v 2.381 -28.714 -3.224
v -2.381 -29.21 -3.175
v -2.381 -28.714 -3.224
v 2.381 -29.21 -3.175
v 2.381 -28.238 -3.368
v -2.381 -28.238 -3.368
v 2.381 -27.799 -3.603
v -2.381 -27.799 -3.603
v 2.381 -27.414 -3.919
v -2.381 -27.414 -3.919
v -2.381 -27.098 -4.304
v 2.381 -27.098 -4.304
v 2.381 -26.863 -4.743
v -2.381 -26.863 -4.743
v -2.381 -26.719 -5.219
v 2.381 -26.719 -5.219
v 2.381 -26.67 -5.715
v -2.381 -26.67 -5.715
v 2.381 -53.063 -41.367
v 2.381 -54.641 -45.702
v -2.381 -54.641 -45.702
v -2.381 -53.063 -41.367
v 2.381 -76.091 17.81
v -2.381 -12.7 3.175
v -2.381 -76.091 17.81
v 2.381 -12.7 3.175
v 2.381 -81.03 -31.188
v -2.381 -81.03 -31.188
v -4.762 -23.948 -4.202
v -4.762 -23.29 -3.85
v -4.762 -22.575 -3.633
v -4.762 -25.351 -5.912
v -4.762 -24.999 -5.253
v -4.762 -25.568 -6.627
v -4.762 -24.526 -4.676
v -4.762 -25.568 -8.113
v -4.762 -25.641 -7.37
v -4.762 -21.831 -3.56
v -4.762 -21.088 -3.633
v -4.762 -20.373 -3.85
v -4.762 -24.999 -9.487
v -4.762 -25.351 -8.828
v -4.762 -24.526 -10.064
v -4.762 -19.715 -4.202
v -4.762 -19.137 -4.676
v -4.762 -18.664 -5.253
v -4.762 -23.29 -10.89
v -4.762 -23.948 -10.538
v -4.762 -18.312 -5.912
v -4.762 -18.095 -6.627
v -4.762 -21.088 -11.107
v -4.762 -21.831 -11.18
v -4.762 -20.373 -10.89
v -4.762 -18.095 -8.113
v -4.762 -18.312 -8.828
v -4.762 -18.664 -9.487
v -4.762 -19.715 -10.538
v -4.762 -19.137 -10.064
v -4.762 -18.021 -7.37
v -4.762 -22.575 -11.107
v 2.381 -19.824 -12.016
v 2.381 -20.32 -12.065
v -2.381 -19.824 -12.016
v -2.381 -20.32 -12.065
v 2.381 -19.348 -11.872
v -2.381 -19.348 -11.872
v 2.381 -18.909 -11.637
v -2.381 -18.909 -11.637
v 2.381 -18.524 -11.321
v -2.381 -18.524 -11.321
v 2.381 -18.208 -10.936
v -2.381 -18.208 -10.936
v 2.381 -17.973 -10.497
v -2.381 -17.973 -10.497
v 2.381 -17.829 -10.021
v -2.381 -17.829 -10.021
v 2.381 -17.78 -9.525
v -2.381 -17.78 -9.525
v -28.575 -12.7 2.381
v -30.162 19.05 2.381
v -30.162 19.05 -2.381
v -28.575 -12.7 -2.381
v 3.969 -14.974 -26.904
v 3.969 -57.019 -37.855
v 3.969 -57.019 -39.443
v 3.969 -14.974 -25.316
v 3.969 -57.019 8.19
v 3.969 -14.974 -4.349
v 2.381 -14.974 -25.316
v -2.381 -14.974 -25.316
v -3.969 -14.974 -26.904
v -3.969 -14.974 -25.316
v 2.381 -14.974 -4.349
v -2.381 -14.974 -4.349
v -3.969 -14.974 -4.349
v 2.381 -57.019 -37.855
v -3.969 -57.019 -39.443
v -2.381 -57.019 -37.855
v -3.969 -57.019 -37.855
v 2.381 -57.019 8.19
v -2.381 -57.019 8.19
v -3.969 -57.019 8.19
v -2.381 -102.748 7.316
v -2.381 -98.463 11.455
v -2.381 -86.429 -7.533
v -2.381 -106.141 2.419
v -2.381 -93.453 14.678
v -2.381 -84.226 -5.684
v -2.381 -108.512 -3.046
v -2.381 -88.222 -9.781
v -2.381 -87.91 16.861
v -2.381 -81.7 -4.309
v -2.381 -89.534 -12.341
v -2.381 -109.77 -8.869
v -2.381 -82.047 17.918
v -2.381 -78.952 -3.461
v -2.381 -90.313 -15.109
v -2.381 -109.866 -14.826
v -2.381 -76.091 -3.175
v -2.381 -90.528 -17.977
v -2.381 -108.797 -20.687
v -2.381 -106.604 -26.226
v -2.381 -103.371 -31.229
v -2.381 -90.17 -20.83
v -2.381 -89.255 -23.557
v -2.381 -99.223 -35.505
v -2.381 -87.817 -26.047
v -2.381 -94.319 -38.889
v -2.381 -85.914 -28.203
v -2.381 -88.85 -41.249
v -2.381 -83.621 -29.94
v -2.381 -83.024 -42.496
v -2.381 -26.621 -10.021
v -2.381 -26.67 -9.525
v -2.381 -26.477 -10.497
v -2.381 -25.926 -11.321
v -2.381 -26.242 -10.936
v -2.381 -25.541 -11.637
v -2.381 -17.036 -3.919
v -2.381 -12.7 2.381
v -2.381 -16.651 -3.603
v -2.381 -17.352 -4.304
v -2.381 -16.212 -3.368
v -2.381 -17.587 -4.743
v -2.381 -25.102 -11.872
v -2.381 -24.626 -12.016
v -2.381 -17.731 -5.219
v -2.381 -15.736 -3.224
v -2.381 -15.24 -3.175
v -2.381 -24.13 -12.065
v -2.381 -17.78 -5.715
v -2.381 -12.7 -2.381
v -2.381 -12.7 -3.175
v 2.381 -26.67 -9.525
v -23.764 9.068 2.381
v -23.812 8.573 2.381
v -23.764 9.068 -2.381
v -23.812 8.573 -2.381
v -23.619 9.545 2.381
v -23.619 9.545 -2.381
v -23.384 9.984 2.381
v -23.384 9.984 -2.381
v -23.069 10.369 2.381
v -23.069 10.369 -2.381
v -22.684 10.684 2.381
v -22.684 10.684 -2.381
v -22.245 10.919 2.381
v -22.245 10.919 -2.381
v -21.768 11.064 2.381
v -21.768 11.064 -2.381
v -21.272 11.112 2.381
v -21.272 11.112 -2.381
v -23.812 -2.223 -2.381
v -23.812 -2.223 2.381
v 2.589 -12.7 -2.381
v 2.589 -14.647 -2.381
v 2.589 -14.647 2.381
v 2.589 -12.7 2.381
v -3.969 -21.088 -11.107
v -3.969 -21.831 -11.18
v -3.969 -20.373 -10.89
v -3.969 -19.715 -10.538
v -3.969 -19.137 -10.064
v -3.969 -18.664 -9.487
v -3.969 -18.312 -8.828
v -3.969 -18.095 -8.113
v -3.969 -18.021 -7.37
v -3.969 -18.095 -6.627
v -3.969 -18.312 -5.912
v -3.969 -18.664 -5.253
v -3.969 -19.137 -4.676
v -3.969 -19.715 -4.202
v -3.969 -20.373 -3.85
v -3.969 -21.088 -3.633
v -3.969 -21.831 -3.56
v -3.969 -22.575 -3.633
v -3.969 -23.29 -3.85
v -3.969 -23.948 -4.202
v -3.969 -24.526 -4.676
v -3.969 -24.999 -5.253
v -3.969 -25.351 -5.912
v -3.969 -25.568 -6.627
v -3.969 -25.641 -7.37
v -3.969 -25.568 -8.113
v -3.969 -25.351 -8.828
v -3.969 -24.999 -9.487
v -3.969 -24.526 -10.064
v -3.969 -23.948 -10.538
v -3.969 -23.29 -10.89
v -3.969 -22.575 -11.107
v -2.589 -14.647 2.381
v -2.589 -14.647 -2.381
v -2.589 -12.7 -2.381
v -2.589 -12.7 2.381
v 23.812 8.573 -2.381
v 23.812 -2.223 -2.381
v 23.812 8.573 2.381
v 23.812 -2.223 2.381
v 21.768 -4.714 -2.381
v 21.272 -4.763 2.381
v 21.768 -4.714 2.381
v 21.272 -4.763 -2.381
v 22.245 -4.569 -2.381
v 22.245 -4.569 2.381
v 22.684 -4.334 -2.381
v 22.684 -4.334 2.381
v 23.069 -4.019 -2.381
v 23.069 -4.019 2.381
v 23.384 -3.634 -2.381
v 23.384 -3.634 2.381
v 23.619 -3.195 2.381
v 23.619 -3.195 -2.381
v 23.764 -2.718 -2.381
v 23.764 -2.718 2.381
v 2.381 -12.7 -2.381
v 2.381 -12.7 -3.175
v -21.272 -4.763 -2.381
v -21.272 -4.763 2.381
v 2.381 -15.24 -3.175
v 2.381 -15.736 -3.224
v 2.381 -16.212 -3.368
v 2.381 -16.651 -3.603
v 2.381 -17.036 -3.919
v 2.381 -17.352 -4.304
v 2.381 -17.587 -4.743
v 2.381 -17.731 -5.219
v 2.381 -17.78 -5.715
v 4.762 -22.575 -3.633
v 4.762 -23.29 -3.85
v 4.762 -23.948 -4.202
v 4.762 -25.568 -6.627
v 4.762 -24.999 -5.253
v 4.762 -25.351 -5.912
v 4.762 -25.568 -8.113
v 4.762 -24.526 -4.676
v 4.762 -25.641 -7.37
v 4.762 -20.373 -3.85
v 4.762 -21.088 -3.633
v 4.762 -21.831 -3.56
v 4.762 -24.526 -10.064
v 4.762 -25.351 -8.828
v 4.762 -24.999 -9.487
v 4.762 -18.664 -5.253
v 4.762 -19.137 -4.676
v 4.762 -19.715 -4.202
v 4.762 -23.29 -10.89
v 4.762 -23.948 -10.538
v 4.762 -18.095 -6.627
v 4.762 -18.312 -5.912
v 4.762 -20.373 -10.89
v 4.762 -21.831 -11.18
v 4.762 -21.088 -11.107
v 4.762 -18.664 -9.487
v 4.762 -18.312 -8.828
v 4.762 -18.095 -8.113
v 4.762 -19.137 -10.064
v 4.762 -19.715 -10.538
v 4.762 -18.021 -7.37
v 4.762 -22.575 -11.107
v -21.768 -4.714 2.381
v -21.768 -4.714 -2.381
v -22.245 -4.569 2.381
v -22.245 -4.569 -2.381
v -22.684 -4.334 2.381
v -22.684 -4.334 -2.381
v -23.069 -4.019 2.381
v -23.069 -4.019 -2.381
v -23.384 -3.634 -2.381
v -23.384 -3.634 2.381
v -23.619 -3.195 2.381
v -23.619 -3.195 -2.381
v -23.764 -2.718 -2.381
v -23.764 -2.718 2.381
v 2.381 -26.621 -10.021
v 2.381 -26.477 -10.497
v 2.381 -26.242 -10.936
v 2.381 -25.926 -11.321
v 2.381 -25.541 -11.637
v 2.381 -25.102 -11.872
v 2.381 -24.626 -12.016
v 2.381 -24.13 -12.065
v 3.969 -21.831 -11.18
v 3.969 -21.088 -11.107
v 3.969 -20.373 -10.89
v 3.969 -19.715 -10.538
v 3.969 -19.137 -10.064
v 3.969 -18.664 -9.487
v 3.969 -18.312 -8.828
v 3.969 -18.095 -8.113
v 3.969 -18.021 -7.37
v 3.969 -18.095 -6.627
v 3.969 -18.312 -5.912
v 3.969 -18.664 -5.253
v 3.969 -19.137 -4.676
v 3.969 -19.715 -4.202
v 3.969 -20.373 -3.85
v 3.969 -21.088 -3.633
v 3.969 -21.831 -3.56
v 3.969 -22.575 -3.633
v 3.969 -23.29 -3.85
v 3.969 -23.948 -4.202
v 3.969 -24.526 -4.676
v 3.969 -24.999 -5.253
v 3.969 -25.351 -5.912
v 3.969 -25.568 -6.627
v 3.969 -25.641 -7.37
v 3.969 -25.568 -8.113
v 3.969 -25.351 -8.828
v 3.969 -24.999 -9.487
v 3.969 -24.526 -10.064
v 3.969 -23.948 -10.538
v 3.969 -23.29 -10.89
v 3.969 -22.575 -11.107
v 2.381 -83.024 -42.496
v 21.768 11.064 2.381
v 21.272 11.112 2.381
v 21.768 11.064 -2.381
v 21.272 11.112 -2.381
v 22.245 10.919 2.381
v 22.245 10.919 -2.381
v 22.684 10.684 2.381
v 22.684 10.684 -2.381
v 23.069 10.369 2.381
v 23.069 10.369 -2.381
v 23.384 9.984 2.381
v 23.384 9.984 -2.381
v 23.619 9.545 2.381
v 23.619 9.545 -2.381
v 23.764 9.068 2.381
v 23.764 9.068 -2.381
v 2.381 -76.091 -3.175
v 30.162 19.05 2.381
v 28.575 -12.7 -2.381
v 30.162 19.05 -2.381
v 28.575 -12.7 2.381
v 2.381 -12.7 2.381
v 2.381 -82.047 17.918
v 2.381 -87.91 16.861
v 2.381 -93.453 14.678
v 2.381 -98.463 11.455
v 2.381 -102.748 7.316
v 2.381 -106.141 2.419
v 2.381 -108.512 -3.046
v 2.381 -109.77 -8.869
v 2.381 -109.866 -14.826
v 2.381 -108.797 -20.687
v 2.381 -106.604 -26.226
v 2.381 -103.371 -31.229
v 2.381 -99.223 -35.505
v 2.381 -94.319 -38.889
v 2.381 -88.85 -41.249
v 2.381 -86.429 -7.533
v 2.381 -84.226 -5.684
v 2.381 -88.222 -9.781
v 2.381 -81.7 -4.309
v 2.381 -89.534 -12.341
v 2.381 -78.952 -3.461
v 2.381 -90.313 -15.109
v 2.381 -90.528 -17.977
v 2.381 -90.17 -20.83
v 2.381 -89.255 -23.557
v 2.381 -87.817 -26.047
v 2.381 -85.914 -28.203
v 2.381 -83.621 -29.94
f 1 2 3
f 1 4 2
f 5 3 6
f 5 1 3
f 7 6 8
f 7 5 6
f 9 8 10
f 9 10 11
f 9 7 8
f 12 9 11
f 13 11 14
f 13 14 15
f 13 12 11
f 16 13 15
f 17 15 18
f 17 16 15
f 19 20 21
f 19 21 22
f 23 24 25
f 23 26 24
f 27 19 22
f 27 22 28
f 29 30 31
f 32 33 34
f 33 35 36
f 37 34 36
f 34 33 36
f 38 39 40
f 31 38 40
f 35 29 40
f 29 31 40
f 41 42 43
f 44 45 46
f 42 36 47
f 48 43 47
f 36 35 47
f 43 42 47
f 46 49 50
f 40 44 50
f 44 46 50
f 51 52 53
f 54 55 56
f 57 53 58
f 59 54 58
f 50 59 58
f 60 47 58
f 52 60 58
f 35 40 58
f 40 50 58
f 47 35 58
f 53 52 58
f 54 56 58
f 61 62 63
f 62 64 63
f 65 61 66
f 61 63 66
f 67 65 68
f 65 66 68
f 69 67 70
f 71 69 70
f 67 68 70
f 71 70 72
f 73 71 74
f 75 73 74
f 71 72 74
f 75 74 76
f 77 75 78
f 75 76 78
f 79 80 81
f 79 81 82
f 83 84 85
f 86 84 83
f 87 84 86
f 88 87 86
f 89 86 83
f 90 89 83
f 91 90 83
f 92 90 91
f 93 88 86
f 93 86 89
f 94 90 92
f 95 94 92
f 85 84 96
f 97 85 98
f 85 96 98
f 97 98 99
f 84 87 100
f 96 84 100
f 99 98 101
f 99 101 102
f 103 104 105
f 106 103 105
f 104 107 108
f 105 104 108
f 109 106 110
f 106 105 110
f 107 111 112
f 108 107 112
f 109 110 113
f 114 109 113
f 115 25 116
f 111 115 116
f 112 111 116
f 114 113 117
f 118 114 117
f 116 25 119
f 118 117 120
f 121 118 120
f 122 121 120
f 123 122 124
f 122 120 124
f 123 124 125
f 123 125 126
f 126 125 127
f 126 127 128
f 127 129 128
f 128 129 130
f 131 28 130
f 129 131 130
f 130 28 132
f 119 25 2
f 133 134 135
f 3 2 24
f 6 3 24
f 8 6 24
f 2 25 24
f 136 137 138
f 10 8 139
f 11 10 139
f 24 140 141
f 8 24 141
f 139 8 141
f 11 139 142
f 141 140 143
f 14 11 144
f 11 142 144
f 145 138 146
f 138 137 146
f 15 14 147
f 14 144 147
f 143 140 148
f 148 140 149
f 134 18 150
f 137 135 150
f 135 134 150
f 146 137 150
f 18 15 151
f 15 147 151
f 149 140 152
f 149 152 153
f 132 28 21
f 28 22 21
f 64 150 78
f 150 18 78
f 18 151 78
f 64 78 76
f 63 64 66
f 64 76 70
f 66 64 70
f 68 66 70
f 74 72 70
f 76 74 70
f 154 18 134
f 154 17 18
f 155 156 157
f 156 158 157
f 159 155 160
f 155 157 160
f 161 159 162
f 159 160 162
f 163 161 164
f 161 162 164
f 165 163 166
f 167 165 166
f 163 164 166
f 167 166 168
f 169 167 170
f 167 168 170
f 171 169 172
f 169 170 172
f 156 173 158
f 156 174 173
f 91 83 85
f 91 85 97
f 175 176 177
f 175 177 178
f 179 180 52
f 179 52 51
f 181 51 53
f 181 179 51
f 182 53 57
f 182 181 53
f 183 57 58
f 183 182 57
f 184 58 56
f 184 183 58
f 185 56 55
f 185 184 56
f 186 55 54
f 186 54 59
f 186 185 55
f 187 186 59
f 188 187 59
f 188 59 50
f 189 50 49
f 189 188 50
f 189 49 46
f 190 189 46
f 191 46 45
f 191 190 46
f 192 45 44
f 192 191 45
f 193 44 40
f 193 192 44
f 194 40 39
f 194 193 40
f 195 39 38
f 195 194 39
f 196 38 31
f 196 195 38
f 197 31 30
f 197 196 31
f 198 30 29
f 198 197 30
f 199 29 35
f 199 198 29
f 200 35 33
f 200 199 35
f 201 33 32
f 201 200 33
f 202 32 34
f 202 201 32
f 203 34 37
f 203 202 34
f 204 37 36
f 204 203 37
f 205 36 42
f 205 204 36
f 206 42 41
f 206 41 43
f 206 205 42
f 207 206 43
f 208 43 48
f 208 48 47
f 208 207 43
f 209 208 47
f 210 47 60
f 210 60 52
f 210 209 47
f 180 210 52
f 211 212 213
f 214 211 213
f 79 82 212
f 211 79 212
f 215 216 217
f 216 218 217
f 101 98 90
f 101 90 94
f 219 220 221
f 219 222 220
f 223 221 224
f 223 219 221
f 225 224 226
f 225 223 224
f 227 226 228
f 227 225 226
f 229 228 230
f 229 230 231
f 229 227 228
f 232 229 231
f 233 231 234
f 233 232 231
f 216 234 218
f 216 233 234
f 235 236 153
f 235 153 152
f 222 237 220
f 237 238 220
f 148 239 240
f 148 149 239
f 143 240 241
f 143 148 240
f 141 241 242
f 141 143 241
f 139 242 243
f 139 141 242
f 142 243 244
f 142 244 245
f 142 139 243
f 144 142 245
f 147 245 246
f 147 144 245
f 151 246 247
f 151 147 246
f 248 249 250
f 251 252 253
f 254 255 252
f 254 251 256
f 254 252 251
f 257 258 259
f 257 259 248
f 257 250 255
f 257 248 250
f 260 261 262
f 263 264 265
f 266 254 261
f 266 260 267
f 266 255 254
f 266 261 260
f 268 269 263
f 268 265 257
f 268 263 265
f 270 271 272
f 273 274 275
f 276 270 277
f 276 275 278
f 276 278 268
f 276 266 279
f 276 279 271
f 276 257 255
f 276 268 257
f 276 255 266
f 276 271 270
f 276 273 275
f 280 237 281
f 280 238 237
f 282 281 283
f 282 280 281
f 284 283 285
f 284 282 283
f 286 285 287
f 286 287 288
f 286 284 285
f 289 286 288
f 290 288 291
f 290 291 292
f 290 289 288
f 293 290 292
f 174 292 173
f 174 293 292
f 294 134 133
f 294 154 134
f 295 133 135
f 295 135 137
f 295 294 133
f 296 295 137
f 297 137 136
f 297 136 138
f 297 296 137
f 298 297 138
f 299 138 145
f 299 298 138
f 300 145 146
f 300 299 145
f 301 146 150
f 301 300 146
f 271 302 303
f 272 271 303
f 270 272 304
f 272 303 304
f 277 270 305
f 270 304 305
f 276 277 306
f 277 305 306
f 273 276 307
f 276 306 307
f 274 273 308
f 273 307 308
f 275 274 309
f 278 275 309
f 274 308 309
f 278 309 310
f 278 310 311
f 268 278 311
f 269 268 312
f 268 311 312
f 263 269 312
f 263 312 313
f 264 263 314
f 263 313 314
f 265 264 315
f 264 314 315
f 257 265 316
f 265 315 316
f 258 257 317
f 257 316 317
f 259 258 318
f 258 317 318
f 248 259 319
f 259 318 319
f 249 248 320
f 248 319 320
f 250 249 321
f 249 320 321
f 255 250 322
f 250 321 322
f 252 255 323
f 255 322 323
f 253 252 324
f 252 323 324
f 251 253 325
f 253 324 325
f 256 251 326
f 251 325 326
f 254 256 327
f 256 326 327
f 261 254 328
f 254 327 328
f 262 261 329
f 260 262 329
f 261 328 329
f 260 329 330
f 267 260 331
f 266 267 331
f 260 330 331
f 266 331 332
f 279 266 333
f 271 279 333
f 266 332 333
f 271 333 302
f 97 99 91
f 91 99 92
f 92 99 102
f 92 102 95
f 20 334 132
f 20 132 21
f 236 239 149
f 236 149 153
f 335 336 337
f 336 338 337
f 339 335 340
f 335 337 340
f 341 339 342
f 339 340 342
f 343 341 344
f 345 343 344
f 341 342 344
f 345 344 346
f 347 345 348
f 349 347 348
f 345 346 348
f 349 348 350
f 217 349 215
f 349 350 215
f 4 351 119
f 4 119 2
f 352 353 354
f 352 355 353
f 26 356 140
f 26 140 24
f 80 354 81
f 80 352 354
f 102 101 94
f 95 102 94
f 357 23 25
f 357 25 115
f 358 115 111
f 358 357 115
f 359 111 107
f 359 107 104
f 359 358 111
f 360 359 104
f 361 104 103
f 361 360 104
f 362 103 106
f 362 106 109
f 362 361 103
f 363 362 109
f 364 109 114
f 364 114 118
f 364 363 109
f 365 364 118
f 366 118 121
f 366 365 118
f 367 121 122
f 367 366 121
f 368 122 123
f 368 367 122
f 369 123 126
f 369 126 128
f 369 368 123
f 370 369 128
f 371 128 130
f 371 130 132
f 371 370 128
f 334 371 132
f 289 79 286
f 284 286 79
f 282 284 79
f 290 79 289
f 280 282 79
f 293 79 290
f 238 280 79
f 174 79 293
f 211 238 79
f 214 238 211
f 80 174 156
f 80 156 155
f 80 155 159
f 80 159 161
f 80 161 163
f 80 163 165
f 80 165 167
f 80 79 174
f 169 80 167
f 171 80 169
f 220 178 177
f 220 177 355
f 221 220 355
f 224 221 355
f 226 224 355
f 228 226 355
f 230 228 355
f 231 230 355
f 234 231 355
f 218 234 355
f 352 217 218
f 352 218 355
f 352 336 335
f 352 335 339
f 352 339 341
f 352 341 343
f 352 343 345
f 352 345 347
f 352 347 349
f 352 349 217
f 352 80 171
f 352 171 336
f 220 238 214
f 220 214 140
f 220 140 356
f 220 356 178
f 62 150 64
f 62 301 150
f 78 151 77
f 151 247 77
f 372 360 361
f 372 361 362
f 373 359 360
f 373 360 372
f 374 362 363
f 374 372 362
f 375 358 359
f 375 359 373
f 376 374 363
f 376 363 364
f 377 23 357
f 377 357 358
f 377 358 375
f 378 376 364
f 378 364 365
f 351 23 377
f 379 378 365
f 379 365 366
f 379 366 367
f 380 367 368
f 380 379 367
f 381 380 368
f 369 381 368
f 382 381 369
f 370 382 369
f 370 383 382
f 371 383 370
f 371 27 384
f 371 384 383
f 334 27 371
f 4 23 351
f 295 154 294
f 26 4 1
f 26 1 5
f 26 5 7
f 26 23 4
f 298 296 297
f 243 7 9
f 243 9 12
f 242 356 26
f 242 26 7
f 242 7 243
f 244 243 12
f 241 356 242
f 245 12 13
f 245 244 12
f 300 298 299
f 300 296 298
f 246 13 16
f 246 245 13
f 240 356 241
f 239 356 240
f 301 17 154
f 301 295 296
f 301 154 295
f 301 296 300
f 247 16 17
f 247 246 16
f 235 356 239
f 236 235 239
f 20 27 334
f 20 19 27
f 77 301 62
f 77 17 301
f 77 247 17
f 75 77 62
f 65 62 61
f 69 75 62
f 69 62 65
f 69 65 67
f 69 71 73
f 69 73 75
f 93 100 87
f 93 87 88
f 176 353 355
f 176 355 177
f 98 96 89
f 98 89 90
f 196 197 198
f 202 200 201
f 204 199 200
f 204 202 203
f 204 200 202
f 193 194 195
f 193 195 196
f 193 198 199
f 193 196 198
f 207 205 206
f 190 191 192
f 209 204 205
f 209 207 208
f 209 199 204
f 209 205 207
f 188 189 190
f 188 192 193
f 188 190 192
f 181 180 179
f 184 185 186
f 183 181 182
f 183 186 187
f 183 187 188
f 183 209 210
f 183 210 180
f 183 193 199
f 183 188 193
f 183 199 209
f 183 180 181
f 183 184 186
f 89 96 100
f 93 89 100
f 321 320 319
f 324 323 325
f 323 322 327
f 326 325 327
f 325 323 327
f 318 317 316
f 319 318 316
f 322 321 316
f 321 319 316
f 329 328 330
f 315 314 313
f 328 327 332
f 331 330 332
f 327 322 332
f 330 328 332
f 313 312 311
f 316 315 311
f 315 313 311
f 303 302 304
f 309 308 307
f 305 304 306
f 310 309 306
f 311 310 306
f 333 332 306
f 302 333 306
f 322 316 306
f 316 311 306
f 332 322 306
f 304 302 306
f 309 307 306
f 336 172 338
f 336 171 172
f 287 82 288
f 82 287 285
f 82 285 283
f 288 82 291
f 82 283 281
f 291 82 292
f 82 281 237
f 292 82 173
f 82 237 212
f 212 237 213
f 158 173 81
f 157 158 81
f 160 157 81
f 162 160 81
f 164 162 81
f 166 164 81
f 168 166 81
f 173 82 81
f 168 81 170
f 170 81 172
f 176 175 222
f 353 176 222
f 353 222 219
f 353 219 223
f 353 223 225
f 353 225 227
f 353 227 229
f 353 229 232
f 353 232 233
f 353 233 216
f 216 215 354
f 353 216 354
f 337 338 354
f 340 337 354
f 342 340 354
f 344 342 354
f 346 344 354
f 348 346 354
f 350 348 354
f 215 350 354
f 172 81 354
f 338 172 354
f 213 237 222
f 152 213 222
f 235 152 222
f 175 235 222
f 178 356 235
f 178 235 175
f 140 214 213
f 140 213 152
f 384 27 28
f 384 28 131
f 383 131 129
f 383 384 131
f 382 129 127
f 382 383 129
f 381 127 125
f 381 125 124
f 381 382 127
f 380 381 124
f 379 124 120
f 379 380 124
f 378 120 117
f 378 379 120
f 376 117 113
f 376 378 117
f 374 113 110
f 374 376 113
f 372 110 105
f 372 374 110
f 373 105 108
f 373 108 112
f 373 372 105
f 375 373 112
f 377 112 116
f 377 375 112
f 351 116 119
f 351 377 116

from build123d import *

# Parameters (mm, degrees)
SKETCH1_W           = 47.625
SKETCH1_H           = 15.875
BOSS_EXTRUDE1_DEPTH = 2.38125
BOSS_EXTRUDE2_DEPTH = 2.38125
BOSS_EXTRUDE3_DEPTH = 1.5875
SKETCH4_W           = 7.9375
SKETCH4_H           = 43.875429772
BOSS_EXTRUDE4_DEPTH = 1.5875
SKETCH5_W           = 8.89
SKETCH5_H           = 8.89
BOSS_EXTRUDE5_DEPTH = 2.38125
FILLET4_R           = 2.54
SKETCH6_R           = 3.81
BOSS_EXTRUDE6_DEPTH = 0.79375
BOSS_EXTRUDE7_DEPTH = 4.7625
FILLET5_R           = 2.54


with BuildPart() as part:
    # Sketch1 → Boss-Extrude1 (new body, symmetric)
    with BuildSketch(Plane.XY):
        Polygon((30.1625, 19.05), (-30.1625, 19.05), (-28.575, -12.7), (28.575, -12.7), align=None)
        with Locations((0, 3.175)):
            Rectangle(SKETCH1_W, SKETCH1_H, mode=Mode.SUBTRACT)
    extrude(amount=BOSS_EXTRUDE1_DEPTH, both=True)

    # Sketch2 → Boss-Extrude2 (add, symmetric)
    with BuildSketch(Plane(origin=(0, 0, 0), x_dir=(0, 0, -1), z_dir=(1, 0, 0))):
        with BuildLine():
            Line((-3.175, -12.7), (-17.80991483, -76.090780508))
            ThreePointArc((-17.80991483, -76.090780508), (8.869373473, -109.769781966), (42.495651539, -83.024072273))
            Line((42.495651539, -83.024072273), (45.702036783, -54.641440894))
            Line((45.702036783, -54.641440894), (41.366666318, -53.06349509))
            Line((41.366666318, -53.06349509), (31.187631555, -81.030163252))
            ThreePointArc((31.187631555, -81.030163252), (15.108998658, -90.313166283), (3.175, -76.090780508))
            Line((3.175, -76.090780508), (3.175, -12.7))
            Line((3.175, -12.7), (-3.175, -12.7))
        make_face()
    extrude(amount=BOSS_EXTRUDE2_DEPTH, both=True)

    # Sketch5 → Boss-Extrude5 (add, symmetric)
    with BuildSketch(Plane(origin=(0, 0, 0), x_dir=(0, 0, -1), z_dir=(1, 0, 0))):
        with Locations((7.62, -22.225)):
            Rectangle(SKETCH5_W, SKETCH5_H)
    extrude(amount=BOSS_EXTRUDE5_DEPTH, both=True)

    # Fillet4
    fillet4_edges = [part.edges().sort_by_distance(p)[0] for p in [
        (0, -17.78, -3.175),
        (0, -26.67, -3.175),
        (0, -26.67, -12.065),
        (0, -17.78, -12.065),
    ]]
    fillet(fillet4_edges, radius=FILLET4_R)


with BuildPart() as body_2:
    # Sketch3 → Boss-Extrude3 (new body)
    with BuildSketch(Plane(origin=(2.38125, 0, 0), x_dir=(0, 0, -1), z_dir=(1, 0, 0))):
        Polygon((37.855386763, -57.019232038), (-8.190255907, -57.019232038), (4.349041665, -14.973788123), (25.316089191, -14.973788123), align=None)
    extrude(amount=BOSS_EXTRUDE3_DEPTH)


with BuildPart() as body_3:
    # Mirror1: mirrored copy
    add(body_2.part.mirror(Plane(origin=(0, 0, 0), x_dir=(0, 0, 1), z_dir=(1, 0, 0))))


with BuildPart() as body_2_1:
    add(body_2.part)

    add(body_3.part)  # Boss-Extrude4 merges body 3
    # Sketch4 → Boss-Extrude4 (add, along a direction that is not the sketch's normal)
    with BuildSketch(Plane(origin=(0, 5.710370927, -19.147410704), x_dir=(-1, 0, 0), z_dir=(0, 0.285793157, -0.958291329))):
        with Locations((0, -43.522131252)):
            Rectangle(SKETCH4_W, SKETCH4_H)
    extrude(amount=BOSS_EXTRUDE4_DEPTH, dir=(0, 0, -1))


with BuildPart() as body_3_2:
    # Sketch6 → Boss-Extrude6 (new body)
    with BuildSketch(Plane(origin=(3.96875, 0, 0), x_dir=(0, 0, -1), z_dir=(1, 0, 0))):
        with Locations((7.3700929, -21.831498009)):
            Circle(SKETCH6_R)
    extrude(amount=BOSS_EXTRUDE6_DEPTH)


with BuildPart() as body_4:
    # Mirror2: mirrored copy
    add(body_3_2.part.mirror(Plane(origin=(0, 0, 0), x_dir=(0, 0, 1), z_dir=(1, 0, 0))))


with BuildPart() as body_5:
    # Sketch7 → Boss-Extrude7 (new body)
    with BuildSketch(Plane(origin=(0, 0, -2.38125), x_dir=(-1, 0, 0), z_dir=(0, 0, -1))):
        Polygon((-28.575, -12.7), (-2.588815181, -14.646611678), (-2.588815181, -12.7), align=None)
    extrude(amount=-BOSS_EXTRUDE7_DEPTH)


with BuildPart() as body_6:
    # Mirror3: mirrored copy
    add(body_5.part.mirror(Plane(origin=(0, 0, 0), x_dir=(0, 0, 1), z_dir=(1, 0, 0))))


with BuildPart() as body_5_1:
    add(body_5.part)

    # Combine1: union part, body 6
    add(part.part)
    add(body_6.part)

    # Fillet5
    fillet5_edges = [body_5_1.edges().sort_by_distance(p)[0] for p in [
        (-23.8125, -4.7625, 0),
        (23.8125, -4.7625, 0),
        (23.8125, 11.1125, 0),
        (-23.8125, 11.1125, 0),
    ]]
    fillet(fillet5_edges, radius=FILLET5_R)


solid = Compound([body_2_1.part, body_3_2.part, body_4.part, body_5_1.part])
